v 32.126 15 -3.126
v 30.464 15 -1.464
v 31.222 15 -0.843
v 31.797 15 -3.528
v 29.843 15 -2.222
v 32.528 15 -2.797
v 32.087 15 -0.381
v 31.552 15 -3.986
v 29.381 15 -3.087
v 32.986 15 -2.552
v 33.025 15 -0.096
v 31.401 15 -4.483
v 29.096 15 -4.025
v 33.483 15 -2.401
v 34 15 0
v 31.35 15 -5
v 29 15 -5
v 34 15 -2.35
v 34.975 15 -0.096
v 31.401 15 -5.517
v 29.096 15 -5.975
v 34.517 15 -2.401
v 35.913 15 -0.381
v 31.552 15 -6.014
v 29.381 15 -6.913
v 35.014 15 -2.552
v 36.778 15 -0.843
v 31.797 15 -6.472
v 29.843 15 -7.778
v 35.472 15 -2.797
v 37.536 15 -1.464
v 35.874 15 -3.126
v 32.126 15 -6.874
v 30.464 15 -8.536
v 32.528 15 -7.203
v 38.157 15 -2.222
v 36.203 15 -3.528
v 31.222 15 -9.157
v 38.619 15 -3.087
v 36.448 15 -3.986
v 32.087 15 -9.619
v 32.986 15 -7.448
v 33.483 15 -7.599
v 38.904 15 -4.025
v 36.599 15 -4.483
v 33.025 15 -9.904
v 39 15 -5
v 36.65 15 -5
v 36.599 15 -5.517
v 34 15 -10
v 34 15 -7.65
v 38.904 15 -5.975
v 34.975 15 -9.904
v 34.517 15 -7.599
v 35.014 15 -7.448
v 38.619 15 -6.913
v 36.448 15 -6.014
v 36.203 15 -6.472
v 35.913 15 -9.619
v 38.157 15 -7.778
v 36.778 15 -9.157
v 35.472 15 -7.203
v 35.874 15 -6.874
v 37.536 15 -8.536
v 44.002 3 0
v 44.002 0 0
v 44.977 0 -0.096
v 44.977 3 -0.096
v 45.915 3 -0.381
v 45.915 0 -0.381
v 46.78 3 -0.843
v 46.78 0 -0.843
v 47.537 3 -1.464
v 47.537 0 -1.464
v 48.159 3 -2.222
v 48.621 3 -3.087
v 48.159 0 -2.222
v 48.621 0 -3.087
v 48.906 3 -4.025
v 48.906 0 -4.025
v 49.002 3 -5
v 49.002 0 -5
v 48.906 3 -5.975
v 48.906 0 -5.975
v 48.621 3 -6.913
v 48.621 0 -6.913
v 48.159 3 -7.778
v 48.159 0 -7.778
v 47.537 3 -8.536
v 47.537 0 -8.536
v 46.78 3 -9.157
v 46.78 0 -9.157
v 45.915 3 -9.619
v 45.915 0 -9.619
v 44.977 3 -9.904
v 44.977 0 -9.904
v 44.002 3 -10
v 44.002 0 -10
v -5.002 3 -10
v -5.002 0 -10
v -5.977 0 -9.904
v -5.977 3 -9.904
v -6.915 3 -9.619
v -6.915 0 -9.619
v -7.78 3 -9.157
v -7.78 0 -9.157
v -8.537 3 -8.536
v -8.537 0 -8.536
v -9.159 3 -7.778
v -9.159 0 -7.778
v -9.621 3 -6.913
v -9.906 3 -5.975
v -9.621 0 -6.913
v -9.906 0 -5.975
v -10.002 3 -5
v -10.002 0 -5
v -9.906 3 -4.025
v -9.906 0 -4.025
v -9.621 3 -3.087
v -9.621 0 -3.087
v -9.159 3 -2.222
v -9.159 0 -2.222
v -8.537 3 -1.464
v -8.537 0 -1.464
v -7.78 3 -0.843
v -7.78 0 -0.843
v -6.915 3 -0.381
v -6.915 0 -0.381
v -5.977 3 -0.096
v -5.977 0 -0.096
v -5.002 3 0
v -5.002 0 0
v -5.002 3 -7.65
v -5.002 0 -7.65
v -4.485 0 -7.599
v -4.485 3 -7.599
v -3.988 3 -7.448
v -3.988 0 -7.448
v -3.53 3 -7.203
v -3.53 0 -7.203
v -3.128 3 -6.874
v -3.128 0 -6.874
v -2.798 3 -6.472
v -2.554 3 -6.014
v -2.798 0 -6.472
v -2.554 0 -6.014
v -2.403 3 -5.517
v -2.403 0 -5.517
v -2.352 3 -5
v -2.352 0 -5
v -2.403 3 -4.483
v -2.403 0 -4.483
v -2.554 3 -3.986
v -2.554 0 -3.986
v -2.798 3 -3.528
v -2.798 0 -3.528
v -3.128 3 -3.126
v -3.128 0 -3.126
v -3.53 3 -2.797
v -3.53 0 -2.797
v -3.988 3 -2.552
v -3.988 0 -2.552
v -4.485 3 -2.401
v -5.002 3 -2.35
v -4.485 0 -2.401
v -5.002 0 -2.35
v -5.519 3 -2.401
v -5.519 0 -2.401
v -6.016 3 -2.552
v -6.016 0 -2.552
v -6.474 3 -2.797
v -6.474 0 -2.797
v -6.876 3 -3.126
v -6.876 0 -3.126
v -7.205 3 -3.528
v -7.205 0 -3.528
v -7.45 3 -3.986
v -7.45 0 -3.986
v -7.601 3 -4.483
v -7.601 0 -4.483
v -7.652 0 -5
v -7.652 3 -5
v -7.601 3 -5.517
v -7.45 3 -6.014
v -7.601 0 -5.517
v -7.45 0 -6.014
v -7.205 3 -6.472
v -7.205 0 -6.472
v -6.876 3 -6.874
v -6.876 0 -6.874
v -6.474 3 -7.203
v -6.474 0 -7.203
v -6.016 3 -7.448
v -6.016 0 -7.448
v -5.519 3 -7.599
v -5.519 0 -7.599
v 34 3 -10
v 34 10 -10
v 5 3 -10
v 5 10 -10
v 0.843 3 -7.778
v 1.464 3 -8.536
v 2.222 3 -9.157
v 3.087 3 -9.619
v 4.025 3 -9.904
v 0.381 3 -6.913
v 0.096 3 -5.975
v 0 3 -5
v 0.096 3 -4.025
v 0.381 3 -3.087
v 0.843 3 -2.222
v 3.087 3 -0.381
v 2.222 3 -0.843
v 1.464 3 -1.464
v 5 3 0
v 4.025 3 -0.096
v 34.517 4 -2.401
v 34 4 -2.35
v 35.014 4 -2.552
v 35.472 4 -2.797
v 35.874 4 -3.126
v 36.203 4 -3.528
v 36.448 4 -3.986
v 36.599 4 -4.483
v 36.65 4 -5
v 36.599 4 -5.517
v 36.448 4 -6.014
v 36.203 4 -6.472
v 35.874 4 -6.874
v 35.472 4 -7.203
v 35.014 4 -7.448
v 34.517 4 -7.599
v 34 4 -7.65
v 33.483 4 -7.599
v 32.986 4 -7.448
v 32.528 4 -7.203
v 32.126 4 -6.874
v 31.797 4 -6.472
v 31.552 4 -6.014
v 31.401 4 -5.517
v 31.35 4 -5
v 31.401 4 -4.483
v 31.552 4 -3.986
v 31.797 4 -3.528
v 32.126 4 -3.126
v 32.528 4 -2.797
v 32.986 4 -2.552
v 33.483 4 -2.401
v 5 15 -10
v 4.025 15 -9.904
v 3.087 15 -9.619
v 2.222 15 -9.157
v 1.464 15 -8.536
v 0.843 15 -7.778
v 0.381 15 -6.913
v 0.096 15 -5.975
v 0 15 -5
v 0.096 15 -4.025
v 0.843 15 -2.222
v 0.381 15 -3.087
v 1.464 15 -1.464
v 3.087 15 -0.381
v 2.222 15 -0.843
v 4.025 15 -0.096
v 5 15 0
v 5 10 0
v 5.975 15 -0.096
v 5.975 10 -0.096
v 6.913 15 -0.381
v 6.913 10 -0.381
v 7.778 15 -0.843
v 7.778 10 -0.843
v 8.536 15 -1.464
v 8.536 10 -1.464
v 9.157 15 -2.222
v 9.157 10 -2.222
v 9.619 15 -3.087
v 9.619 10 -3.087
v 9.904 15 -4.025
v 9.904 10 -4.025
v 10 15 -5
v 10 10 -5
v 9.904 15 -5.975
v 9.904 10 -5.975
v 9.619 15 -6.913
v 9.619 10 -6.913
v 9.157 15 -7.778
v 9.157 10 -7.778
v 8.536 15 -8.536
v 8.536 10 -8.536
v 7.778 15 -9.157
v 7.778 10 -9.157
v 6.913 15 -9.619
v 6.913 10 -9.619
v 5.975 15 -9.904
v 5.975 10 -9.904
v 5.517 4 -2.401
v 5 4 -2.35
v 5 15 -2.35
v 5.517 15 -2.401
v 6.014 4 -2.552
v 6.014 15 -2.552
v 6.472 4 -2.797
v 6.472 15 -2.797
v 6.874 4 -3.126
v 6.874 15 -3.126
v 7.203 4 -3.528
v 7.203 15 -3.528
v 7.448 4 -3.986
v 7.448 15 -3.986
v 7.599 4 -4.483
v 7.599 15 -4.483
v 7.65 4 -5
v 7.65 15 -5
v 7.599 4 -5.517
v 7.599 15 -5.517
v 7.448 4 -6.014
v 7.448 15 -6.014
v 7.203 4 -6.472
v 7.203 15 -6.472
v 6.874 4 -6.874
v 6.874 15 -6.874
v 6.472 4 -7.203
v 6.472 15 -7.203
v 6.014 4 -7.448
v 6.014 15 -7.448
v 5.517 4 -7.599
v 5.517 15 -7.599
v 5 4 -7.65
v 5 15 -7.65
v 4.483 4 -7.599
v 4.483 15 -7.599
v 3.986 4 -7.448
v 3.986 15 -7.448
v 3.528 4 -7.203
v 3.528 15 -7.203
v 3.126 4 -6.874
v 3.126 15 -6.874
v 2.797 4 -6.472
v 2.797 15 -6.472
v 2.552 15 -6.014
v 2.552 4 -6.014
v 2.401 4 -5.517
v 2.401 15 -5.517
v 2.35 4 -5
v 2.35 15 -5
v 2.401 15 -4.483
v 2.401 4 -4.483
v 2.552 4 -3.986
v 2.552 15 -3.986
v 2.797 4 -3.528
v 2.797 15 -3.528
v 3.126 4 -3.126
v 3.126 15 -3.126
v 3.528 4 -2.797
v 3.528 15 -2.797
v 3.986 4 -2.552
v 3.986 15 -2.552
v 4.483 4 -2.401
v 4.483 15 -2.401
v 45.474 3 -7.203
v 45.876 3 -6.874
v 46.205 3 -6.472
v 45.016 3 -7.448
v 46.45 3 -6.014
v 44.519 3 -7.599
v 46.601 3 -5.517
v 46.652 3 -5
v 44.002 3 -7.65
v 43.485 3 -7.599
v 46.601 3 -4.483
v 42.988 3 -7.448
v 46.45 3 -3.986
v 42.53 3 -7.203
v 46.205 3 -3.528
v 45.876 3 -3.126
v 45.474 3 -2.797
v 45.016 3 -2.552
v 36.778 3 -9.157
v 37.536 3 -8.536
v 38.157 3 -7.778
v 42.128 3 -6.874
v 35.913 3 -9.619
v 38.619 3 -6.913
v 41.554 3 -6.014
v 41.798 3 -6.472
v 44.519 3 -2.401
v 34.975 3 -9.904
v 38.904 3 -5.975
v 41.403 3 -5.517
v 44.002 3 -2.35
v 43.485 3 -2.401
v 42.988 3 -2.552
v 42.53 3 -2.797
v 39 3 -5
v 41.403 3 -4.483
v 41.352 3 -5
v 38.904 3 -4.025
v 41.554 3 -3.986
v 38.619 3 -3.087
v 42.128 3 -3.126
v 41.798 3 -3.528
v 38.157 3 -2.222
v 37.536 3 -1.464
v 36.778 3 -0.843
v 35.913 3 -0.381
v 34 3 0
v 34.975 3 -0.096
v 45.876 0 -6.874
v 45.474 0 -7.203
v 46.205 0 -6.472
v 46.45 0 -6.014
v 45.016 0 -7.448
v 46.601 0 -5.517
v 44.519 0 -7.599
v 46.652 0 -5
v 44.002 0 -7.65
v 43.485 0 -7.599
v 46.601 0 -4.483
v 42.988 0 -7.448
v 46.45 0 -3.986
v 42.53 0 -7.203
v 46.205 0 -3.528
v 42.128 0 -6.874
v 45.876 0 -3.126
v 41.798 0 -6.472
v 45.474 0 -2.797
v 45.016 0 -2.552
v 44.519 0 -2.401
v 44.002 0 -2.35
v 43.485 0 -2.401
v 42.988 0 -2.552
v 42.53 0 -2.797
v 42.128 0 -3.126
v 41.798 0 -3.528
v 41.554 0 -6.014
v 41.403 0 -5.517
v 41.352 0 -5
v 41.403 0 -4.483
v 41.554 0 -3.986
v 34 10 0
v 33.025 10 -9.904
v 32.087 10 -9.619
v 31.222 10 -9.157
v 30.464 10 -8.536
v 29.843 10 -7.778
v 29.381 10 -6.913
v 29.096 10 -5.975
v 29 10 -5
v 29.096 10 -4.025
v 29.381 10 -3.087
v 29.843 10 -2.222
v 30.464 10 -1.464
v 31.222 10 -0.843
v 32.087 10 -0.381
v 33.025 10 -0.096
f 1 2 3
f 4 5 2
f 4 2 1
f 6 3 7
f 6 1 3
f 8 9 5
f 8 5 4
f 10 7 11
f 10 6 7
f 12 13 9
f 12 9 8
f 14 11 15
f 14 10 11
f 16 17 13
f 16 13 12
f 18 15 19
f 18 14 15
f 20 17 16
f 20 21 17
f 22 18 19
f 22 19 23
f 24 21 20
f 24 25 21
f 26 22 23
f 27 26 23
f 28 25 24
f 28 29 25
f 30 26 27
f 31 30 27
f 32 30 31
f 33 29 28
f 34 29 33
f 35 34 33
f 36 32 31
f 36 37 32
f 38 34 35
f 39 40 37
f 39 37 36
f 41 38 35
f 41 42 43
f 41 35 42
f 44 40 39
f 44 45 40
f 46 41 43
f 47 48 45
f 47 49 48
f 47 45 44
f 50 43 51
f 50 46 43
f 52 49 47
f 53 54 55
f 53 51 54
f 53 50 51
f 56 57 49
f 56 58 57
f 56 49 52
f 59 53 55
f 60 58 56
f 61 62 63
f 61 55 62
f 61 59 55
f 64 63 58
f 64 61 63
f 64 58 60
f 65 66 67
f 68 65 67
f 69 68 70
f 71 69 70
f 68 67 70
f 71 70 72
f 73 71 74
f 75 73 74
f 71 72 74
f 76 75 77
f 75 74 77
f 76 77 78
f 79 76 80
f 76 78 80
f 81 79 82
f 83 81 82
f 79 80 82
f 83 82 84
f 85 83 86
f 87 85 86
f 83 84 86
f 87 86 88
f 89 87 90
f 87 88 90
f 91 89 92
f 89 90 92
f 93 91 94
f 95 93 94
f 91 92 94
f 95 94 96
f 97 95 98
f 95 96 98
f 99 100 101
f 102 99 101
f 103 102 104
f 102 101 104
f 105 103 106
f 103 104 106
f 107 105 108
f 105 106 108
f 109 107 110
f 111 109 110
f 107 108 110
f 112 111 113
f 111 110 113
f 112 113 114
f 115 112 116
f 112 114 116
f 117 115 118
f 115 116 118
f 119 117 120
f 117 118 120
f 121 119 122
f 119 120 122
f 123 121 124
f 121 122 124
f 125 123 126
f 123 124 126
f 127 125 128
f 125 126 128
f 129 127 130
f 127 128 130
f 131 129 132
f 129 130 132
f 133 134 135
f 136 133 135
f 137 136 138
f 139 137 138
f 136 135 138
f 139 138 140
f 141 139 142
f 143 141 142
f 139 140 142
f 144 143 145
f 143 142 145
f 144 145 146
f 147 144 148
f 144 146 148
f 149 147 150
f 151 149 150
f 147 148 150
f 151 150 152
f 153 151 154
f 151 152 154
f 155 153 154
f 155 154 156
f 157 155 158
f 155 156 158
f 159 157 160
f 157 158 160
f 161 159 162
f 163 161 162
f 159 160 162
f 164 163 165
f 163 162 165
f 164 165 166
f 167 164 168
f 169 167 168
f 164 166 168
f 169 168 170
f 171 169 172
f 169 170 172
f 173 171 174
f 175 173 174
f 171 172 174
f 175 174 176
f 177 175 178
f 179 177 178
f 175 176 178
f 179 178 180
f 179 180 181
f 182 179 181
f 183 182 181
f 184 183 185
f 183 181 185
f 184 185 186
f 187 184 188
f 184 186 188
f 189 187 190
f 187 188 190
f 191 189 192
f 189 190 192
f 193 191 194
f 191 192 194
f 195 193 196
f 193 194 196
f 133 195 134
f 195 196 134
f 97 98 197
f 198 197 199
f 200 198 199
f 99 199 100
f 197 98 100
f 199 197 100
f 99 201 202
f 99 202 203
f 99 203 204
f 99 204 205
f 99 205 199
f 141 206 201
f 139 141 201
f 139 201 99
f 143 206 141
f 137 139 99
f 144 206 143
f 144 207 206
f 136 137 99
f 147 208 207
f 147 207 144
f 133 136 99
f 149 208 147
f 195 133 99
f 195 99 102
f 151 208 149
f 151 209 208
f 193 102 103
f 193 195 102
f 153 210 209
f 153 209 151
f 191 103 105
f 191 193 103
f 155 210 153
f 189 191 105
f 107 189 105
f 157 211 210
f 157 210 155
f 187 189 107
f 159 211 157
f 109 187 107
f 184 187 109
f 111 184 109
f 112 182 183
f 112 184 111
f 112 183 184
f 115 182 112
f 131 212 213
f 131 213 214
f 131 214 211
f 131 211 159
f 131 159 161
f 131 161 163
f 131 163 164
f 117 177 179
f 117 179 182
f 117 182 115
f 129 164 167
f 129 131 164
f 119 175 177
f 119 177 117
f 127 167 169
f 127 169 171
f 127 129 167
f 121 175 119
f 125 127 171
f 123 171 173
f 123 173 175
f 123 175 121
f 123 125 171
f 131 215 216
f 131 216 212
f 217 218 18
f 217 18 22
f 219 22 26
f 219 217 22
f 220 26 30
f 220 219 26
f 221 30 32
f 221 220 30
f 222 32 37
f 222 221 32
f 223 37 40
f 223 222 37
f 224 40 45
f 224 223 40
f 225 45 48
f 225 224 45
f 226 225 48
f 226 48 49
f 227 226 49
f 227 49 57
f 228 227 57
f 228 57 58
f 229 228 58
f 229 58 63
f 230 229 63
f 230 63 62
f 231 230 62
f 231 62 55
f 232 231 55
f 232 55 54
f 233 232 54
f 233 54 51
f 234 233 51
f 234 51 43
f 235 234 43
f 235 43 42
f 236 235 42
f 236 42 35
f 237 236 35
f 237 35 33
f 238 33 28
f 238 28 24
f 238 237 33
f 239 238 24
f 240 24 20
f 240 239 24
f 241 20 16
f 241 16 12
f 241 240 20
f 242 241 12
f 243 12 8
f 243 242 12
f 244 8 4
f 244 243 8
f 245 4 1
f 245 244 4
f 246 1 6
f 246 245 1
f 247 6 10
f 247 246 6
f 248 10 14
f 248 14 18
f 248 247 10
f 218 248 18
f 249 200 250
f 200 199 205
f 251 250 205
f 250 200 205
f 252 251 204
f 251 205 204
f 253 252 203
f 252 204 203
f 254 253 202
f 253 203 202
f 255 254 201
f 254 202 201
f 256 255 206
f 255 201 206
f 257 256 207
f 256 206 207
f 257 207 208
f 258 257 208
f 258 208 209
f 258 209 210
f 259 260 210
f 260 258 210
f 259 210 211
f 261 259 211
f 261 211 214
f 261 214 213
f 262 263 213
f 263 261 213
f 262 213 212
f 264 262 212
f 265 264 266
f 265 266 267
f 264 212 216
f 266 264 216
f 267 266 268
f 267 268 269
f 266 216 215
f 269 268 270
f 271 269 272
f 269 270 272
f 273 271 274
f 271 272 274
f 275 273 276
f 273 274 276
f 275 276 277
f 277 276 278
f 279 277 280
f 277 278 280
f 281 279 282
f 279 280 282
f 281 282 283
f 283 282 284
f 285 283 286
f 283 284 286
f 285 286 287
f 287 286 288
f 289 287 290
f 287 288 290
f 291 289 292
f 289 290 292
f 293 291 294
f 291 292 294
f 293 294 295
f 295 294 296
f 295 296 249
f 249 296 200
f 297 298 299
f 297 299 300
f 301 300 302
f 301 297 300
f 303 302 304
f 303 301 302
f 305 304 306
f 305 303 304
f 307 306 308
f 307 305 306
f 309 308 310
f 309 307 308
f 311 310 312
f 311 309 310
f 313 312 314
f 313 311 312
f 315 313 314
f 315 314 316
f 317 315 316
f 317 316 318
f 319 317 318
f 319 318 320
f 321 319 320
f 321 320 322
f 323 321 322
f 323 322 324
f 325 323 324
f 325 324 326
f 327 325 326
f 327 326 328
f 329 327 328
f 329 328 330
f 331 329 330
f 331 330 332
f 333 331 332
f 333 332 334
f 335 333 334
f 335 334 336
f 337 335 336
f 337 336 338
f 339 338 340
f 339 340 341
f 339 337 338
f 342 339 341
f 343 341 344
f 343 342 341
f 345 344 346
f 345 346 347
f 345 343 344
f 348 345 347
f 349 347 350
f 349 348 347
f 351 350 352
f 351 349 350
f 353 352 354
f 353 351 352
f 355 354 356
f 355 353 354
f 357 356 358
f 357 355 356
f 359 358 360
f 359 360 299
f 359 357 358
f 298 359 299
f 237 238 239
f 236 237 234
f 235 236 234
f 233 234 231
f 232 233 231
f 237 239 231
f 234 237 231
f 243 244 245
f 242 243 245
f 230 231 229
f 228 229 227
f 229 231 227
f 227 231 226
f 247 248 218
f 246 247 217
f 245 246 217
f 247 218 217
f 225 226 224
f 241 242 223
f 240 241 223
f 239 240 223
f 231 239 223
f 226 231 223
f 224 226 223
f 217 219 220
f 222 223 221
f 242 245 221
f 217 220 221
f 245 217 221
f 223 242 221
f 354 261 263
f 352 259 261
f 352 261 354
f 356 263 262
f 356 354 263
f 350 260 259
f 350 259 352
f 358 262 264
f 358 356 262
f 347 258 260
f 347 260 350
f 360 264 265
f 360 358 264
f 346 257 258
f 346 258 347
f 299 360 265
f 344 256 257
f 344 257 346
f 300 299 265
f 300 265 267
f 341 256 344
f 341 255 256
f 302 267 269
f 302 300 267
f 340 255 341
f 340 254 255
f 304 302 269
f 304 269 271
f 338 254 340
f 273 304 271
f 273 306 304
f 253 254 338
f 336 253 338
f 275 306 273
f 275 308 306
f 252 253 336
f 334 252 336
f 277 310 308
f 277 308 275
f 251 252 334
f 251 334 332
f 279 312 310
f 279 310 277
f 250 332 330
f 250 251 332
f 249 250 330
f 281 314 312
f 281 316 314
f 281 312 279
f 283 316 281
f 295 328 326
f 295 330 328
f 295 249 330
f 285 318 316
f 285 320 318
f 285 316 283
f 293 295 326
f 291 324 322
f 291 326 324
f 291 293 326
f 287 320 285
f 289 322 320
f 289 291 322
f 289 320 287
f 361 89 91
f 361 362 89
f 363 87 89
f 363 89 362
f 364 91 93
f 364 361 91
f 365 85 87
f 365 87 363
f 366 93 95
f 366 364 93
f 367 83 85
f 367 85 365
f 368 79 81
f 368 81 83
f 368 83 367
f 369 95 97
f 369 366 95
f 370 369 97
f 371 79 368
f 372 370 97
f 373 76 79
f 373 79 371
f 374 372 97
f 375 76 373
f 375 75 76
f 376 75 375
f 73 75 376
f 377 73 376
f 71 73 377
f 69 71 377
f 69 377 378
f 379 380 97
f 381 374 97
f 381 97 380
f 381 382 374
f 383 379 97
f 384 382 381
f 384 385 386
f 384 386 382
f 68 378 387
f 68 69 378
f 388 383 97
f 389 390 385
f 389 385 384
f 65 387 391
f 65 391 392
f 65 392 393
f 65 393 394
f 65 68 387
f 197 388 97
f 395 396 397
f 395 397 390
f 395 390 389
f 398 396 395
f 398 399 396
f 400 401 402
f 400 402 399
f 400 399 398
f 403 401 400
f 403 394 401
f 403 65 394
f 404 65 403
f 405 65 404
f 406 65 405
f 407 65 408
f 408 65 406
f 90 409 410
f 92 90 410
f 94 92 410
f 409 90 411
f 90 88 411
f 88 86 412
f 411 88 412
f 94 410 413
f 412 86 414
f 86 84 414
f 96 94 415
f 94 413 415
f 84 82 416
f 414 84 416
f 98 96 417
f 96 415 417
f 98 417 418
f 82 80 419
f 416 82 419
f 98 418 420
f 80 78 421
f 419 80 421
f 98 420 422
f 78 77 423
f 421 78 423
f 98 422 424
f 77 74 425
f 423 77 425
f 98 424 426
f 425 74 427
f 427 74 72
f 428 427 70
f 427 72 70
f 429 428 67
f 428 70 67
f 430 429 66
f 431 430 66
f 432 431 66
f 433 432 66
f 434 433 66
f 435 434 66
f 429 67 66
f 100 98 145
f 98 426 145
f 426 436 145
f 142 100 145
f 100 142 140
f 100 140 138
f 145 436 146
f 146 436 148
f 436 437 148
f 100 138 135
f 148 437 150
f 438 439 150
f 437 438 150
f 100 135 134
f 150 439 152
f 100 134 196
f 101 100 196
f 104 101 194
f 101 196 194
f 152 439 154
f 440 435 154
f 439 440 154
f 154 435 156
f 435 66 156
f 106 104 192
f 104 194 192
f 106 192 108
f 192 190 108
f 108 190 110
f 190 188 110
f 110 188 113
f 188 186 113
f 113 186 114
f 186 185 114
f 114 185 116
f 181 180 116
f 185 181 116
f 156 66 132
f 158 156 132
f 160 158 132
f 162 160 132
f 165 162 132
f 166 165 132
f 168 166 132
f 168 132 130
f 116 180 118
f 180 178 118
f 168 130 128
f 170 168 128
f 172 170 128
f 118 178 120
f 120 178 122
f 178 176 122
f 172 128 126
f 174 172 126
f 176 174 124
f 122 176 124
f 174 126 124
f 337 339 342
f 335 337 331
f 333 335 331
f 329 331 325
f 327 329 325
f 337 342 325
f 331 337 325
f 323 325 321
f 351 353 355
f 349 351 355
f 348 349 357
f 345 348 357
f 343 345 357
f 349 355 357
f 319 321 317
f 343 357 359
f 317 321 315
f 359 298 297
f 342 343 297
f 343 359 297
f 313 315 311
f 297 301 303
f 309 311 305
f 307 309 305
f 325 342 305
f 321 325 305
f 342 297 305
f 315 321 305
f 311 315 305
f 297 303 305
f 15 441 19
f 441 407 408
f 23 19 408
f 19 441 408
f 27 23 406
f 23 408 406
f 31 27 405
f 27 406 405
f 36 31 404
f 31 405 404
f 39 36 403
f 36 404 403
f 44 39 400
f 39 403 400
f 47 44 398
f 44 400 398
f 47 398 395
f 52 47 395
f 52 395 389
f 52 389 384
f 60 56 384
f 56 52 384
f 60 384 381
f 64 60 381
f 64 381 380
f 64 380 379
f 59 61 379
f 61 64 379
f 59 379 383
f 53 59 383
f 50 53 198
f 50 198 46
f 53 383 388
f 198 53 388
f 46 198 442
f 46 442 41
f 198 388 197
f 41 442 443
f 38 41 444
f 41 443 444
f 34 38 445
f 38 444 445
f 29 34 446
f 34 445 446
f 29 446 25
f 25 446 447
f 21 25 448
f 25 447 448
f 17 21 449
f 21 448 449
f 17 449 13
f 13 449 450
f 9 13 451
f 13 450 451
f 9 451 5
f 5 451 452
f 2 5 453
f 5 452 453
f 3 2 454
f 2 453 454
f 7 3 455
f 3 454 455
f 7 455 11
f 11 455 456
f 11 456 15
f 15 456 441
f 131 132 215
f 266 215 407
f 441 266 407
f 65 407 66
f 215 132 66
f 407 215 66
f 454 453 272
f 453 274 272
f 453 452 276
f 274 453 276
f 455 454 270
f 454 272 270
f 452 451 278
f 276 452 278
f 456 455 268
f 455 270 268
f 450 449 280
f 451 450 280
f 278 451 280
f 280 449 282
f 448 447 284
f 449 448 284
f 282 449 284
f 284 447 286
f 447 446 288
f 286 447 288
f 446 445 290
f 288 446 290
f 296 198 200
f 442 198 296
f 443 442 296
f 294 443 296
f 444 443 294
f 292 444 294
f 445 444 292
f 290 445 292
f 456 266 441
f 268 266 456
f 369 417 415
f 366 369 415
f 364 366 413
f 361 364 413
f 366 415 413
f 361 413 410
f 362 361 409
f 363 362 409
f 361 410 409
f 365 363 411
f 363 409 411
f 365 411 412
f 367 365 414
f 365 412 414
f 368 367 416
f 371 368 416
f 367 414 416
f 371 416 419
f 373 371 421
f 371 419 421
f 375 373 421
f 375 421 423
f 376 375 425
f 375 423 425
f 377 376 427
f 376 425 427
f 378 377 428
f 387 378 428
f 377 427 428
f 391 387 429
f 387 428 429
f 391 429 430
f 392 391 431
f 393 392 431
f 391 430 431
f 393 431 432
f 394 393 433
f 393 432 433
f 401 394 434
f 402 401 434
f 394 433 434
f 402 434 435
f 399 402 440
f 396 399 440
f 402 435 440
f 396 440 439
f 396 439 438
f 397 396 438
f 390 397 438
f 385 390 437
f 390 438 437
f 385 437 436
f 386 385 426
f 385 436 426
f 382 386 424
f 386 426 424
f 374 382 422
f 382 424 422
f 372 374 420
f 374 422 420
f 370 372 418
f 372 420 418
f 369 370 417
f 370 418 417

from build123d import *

# Parameters (mm, degrees)
ESQUISSE1_R             = 2.65
BOSS_EXTRU_1_DEPTH      = 15
ESQUISSE2_R             = 3.488871883
ESQUISSE2_R_2           = 3.573781448
BOSS_EXTRU_2_DEPTH      = 4
ENL_V_START             = -5
ENL_V_MAT_EXTRU_1_DEPTH = 5
ESQUISSE8_R             = 2.65
BOSS_EXTRU_3_DEPTH      = 3


with BuildPart() as part:
    # Esquisse1 → Boss.-Extru.1 (new body)
    with BuildSketch(Plane(origin=(0, 0, 0), x_dir=(1, 0, 0), z_dir=(0, 1, 0))):
        with BuildLine():
            Line((5, 0), (34, 0))
            ThreePointArc((34, 0), (39, 5), (34, 10))
            Line((34, 10), (5, 10))
            ThreePointArc((5, 10), (0, 5), (5, 0))
        make_face()
        with Locations(Location((5, 5, 0), (0, 0, 270))):
            Circle(ESQUISSE1_R, mode=Mode.SUBTRACT)
        with Locations(Location((34, 5, 0), (0, 0, 270))):
            Circle(ESQUISSE1_R, mode=Mode.SUBTRACT)
    extrude(amount=BOSS_EXTRU_1_DEPTH)

    # Esquisse2 → Boss.-Extru.2 (add)
    with BuildSketch(Plane.XZ):
        with Locations((5, -5)):
            Circle(ESQUISSE2_R)
        with Locations((34, -5)):
            Circle(ESQUISSE2_R_2)
    extrude(amount=-BOSS_EXTRU_2_DEPTH)

    # Esquisse3 → Enlèv. mat.-Extru.1 (cut)
    with BuildSketch(Plane(origin=(0, 15, 0), x_dir=(1, 0, 0), z_dir=(0, 1, 0)).offset(ENL_V_START)):
        with BuildLine():
            Line((5, 10), (34, 10))
            ThreePointArc((34, 10), (29, 5), (34, 0))
            Line((34, 0), (5, 0))
            ThreePointArc((5, 0), (10, 5), (5, 10))
        make_face()
    extrude(amount=ENL_V_MAT_EXTRU_1_DEPTH, mode=Mode.SUBTRACT)

    # Esquisse8 → Boss.-Extru.3 (add)
    with BuildSketch(Plane.XZ):
        with BuildLine():
            Line((44.001861421, -10), (-5.001861421, -10))
            ThreePointArc((-5.001861421, -10), (-10.001861421, -5), (-5.001861421, 0))
            Line((-5.001861421, 0), (44.001861421, 0))
            ThreePointArc((44.001861421, 0), (49.001861421, -5), (44.001861421, -10))
        make_face()
        with Locations(Location((-5.001861421, -5, 0), (0, 0, 270))):
            Circle(ESQUISSE8_R, mode=Mode.SUBTRACT)
        with Locations(Location((44.001861421, -5, 0), (0, 0, 270))):
            Circle(ESQUISSE8_R, mode=Mode.SUBTRACT)
    extrude(amount=-BOSS_EXTRU_3_DEPTH)


solid = part.part
